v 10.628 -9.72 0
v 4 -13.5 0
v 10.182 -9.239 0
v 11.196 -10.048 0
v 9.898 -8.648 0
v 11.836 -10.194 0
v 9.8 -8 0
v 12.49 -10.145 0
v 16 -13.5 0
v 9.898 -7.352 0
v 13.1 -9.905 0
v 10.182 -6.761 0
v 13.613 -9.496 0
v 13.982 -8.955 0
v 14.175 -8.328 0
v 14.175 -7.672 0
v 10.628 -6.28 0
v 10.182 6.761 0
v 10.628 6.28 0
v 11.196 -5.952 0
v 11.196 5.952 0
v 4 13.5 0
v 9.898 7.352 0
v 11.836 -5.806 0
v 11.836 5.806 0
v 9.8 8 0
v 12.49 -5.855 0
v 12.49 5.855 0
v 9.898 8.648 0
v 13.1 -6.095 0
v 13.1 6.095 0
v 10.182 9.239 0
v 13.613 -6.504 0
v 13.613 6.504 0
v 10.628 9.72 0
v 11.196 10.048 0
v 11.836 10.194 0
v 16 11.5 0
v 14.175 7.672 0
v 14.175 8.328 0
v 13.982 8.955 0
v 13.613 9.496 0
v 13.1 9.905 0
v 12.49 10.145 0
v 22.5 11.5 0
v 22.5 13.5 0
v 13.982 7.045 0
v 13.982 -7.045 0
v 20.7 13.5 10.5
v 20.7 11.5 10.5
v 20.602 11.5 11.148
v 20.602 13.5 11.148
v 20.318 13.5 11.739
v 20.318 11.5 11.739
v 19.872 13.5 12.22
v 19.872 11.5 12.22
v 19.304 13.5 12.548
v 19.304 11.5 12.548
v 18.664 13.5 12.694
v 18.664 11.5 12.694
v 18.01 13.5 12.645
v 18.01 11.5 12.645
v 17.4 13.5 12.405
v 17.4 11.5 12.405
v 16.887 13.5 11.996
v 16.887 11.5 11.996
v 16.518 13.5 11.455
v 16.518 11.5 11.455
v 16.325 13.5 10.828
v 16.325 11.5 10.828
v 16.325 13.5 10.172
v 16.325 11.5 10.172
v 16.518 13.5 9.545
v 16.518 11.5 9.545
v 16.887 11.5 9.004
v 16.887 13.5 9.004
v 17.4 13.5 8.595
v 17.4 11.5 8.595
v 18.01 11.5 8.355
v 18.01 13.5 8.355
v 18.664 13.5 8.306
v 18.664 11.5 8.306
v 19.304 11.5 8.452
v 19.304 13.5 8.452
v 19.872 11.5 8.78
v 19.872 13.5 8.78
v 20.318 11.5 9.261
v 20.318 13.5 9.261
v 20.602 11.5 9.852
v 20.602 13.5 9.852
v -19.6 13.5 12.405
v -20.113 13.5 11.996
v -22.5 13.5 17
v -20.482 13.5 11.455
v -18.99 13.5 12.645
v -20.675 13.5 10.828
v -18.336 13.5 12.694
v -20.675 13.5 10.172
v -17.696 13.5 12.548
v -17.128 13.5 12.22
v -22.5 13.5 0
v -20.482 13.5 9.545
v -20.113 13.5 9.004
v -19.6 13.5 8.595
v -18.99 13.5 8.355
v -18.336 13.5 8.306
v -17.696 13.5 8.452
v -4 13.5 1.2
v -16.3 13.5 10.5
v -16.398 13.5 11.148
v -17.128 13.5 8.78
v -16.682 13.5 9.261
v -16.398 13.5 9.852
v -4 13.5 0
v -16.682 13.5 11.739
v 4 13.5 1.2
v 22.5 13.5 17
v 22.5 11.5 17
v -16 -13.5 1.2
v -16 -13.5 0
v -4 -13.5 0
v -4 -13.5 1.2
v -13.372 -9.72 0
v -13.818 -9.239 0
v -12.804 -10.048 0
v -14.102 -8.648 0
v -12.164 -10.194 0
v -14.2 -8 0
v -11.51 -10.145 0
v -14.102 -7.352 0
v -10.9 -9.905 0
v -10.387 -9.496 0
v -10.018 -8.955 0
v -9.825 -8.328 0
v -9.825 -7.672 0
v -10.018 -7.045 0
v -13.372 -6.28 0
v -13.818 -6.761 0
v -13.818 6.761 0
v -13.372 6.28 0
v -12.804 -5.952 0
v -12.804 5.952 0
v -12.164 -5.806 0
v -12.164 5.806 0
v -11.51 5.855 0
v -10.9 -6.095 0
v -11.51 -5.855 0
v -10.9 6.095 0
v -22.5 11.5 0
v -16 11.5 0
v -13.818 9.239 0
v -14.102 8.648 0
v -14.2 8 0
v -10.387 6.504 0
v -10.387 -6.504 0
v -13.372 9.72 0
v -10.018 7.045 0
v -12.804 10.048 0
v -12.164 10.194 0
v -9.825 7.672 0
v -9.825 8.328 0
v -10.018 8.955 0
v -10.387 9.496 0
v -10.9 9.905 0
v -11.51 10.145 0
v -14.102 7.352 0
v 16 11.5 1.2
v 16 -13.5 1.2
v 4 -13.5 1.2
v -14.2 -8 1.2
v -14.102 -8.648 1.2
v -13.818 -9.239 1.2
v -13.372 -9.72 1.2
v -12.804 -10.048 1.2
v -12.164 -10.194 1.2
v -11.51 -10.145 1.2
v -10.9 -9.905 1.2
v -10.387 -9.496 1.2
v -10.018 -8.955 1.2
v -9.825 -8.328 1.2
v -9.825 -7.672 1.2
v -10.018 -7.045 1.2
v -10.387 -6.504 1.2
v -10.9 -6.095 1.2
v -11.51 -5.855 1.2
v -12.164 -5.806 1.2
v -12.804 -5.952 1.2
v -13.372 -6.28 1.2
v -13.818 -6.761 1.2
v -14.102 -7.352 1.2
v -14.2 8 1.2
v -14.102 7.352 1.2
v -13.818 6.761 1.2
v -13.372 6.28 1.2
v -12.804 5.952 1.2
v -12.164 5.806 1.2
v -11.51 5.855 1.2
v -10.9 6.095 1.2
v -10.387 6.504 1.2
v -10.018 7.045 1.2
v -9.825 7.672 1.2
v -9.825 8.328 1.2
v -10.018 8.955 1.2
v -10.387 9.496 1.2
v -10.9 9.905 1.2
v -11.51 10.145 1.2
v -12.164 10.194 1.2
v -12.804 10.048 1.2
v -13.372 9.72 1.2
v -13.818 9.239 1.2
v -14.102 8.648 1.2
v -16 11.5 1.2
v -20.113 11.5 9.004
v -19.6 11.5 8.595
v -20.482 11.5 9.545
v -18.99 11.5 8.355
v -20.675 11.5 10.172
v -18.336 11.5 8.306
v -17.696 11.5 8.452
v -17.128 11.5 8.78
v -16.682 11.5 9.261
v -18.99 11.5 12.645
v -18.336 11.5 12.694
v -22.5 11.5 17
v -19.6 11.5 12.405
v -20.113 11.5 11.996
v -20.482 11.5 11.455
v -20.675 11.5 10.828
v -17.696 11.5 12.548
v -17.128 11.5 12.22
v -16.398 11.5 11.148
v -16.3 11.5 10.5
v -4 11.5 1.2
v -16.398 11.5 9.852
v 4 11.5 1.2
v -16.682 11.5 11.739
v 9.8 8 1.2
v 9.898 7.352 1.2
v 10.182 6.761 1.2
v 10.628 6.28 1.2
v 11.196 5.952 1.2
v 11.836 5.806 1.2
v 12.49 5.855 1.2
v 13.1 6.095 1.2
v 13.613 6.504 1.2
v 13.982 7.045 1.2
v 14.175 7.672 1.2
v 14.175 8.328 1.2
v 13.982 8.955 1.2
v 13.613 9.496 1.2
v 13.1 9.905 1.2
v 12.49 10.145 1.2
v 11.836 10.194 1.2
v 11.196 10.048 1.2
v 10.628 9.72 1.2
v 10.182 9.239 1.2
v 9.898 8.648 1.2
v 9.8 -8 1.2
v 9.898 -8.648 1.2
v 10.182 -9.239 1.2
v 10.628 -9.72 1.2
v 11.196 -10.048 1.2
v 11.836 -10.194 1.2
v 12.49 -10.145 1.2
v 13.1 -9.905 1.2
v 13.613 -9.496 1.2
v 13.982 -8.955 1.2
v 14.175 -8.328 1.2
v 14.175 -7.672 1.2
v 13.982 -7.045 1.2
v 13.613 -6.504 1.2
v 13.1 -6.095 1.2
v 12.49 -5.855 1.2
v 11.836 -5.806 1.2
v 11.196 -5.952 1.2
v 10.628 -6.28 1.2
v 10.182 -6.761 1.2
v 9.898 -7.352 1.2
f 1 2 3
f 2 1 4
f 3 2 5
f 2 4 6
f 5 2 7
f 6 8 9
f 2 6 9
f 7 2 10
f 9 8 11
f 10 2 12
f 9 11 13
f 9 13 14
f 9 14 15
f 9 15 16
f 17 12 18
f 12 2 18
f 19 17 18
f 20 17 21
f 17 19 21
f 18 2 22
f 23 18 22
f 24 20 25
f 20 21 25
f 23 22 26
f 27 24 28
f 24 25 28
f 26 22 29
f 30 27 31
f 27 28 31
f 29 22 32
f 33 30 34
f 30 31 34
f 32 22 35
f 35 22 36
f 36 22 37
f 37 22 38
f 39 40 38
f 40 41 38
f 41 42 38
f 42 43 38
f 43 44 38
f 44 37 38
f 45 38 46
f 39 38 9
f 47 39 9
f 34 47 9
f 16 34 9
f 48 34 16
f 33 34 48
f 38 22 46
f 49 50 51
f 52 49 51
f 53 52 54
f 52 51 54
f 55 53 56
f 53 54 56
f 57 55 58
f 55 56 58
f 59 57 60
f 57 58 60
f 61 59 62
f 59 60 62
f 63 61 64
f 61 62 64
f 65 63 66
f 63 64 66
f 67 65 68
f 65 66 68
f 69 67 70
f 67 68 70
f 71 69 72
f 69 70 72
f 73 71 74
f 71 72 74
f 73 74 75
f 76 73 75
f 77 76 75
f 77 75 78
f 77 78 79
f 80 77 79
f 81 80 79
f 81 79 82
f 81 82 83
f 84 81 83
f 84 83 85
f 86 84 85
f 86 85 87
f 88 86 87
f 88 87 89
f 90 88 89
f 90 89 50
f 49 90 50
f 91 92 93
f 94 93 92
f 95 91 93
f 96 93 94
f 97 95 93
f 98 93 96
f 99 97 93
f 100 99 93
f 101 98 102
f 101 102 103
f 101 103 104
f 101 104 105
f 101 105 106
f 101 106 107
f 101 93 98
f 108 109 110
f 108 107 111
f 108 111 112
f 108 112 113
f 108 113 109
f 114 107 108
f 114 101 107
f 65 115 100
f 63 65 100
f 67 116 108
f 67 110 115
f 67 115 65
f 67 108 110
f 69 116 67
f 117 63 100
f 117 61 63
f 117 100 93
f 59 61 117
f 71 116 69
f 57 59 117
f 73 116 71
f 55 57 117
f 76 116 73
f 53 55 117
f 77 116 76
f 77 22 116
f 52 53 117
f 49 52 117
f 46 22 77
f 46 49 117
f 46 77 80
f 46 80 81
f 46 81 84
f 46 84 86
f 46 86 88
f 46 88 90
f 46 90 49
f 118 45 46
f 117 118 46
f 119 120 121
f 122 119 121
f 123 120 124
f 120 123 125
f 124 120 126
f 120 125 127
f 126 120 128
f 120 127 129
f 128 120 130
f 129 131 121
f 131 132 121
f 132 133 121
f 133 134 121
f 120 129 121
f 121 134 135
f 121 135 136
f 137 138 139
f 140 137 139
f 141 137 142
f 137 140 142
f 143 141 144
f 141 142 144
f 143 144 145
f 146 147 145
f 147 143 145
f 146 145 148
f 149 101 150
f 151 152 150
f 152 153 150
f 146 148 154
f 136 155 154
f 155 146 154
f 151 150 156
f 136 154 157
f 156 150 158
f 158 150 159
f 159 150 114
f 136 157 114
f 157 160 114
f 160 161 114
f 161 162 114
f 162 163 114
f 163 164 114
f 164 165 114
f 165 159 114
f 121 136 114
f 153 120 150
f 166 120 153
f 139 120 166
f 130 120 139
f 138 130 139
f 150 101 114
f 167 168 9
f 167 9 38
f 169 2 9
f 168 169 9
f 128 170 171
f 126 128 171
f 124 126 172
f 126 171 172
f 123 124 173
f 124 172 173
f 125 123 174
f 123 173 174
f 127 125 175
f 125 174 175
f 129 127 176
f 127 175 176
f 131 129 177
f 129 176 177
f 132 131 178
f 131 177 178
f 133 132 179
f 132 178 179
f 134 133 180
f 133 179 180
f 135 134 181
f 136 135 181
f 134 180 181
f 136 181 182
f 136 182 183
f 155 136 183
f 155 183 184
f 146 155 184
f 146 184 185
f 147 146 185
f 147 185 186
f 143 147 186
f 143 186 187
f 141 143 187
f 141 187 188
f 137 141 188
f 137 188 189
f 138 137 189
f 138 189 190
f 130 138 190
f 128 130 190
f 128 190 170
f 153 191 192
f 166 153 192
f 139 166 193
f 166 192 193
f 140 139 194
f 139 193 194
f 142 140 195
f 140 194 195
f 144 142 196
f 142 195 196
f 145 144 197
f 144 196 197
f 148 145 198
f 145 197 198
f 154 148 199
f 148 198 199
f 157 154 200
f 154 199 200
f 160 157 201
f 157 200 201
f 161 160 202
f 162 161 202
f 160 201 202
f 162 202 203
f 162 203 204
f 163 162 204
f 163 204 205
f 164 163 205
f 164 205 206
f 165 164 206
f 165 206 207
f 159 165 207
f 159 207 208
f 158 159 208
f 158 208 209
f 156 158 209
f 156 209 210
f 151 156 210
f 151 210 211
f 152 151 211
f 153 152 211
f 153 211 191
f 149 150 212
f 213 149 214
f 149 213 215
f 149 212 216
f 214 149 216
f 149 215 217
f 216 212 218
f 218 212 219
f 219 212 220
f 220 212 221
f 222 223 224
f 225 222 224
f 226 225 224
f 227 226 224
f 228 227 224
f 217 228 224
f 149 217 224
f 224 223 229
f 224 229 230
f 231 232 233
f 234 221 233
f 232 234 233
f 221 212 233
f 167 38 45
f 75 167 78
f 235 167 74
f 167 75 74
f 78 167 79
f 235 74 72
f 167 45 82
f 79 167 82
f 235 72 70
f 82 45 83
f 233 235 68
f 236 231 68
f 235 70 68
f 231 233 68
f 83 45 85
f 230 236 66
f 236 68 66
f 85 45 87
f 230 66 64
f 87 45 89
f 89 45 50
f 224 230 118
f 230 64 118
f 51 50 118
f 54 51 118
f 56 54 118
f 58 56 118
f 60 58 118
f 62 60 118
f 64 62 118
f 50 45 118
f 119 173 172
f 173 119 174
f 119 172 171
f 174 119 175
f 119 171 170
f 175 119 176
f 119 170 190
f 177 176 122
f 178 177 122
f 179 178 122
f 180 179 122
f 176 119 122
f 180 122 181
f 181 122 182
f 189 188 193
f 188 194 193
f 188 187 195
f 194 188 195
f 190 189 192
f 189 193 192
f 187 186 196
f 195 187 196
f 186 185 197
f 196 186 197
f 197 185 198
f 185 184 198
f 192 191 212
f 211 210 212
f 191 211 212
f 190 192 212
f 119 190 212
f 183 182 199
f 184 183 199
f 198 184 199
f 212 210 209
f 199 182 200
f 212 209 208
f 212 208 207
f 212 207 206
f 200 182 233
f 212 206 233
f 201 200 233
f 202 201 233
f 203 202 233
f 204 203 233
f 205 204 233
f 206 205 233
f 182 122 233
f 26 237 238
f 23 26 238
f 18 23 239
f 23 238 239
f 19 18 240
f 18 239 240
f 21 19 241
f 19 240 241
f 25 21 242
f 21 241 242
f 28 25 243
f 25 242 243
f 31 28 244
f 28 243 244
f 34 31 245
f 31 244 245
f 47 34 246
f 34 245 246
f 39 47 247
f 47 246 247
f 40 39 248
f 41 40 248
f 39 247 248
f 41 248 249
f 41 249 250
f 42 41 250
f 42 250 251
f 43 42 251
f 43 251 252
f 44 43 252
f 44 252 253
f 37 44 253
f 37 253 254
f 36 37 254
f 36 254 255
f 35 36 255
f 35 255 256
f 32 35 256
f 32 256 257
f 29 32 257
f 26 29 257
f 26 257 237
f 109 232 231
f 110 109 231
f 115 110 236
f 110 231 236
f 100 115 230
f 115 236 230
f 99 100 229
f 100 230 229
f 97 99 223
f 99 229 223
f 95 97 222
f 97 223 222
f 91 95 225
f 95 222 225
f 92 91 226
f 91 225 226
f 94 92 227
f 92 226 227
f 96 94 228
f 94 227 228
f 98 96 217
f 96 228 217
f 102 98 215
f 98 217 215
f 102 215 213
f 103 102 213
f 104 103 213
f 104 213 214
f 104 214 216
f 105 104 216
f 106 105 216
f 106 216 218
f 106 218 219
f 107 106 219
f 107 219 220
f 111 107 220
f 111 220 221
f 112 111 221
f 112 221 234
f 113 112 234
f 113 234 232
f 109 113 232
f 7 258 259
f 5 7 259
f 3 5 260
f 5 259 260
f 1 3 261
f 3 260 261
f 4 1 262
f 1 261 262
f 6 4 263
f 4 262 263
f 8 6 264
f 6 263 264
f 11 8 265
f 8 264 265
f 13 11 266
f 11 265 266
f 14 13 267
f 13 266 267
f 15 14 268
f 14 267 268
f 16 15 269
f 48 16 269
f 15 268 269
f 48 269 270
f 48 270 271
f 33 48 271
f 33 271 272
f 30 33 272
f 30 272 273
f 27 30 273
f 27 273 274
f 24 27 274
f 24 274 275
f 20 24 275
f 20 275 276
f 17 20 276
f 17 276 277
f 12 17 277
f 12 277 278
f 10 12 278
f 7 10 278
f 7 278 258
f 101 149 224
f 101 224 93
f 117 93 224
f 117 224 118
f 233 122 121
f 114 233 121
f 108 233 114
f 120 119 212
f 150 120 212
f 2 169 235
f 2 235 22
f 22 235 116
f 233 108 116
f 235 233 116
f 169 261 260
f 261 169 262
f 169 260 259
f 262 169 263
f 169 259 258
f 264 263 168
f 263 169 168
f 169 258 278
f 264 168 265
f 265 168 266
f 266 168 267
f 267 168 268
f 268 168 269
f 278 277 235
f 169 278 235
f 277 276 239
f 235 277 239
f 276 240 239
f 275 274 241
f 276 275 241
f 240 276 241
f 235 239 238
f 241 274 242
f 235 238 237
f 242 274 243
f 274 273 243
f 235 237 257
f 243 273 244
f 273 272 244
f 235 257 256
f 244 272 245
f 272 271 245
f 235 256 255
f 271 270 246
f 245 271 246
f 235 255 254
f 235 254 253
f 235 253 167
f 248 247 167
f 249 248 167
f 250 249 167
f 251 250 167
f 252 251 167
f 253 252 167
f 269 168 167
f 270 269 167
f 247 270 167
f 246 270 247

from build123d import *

# Parameters (mm, degrees)
F0_W      = 45
F0_H      = 27
F1_DEPTH  = 17
F2_W      = 25
F2_H      = 15.8
F3_DEPTH  = 45.001
F4_W      = 8
F4_H      = 27
F5_DEPTH  = 1.201
F7_D      = 4.4
F9_D      = 4.4
F10_W     = 6.5
F10_H     = 25
F11_DEPTH = 1.201


with BuildPart() as f1:
    # F0 (on Top) → F1 (new body)
    with BuildSketch(Plane.XY):
        Rectangle(F0_W, F0_H)
    extrude(amount=F1_DEPTH)

    # F2 (on face) → F3 (cut, through all)
    with BuildSketch(Plane.YZ.offset(22.5)):
        with Locations((-1, 9.1)):
            Rectangle(F2_W, F2_H)
    extrude(amount=-F3_DEPTH, mode=Mode.SUBTRACT)

    # F4 (on face) → F5 (cut, through all)
    with BuildSketch(Plane.XY.offset(1.2)):
        Rectangle(F4_W, F4_H)
    extrude(amount=-F5_DEPTH, mode=Mode.SUBTRACT)

    # F7 (through all)
    with Locations(Plane(origin=(0, 0, 0), x_dir=(1, 0, 0), z_dir=(0, 0, -1))):
        with Locations((-12, 8), (12, 8), (12, -8), (-12, -8)):
            Hole(F7_D / 2)

    # F9 (through all)
    with Locations(Plane(origin=(0, 13.5, 0), x_dir=(-1, 0, 0), z_dir=(0, 1, 0))):
        with Locations((18.5, 10.5), (-18.5, 10.5)):
            Hole(F9_D / 2)

    # F10 (on face) → F11 (cut, through all)
    with BuildSketch(Plane.XY.offset(1.2)):
        with Locations((-19.25, -1)):
            Rectangle(F10_W, F10_H)
        with Locations((19.25, -1)):
            Rectangle(F10_W, F10_H)
    extrude(amount=-F11_DEPTH, mode=Mode.SUBTRACT)


solid = f1.part
